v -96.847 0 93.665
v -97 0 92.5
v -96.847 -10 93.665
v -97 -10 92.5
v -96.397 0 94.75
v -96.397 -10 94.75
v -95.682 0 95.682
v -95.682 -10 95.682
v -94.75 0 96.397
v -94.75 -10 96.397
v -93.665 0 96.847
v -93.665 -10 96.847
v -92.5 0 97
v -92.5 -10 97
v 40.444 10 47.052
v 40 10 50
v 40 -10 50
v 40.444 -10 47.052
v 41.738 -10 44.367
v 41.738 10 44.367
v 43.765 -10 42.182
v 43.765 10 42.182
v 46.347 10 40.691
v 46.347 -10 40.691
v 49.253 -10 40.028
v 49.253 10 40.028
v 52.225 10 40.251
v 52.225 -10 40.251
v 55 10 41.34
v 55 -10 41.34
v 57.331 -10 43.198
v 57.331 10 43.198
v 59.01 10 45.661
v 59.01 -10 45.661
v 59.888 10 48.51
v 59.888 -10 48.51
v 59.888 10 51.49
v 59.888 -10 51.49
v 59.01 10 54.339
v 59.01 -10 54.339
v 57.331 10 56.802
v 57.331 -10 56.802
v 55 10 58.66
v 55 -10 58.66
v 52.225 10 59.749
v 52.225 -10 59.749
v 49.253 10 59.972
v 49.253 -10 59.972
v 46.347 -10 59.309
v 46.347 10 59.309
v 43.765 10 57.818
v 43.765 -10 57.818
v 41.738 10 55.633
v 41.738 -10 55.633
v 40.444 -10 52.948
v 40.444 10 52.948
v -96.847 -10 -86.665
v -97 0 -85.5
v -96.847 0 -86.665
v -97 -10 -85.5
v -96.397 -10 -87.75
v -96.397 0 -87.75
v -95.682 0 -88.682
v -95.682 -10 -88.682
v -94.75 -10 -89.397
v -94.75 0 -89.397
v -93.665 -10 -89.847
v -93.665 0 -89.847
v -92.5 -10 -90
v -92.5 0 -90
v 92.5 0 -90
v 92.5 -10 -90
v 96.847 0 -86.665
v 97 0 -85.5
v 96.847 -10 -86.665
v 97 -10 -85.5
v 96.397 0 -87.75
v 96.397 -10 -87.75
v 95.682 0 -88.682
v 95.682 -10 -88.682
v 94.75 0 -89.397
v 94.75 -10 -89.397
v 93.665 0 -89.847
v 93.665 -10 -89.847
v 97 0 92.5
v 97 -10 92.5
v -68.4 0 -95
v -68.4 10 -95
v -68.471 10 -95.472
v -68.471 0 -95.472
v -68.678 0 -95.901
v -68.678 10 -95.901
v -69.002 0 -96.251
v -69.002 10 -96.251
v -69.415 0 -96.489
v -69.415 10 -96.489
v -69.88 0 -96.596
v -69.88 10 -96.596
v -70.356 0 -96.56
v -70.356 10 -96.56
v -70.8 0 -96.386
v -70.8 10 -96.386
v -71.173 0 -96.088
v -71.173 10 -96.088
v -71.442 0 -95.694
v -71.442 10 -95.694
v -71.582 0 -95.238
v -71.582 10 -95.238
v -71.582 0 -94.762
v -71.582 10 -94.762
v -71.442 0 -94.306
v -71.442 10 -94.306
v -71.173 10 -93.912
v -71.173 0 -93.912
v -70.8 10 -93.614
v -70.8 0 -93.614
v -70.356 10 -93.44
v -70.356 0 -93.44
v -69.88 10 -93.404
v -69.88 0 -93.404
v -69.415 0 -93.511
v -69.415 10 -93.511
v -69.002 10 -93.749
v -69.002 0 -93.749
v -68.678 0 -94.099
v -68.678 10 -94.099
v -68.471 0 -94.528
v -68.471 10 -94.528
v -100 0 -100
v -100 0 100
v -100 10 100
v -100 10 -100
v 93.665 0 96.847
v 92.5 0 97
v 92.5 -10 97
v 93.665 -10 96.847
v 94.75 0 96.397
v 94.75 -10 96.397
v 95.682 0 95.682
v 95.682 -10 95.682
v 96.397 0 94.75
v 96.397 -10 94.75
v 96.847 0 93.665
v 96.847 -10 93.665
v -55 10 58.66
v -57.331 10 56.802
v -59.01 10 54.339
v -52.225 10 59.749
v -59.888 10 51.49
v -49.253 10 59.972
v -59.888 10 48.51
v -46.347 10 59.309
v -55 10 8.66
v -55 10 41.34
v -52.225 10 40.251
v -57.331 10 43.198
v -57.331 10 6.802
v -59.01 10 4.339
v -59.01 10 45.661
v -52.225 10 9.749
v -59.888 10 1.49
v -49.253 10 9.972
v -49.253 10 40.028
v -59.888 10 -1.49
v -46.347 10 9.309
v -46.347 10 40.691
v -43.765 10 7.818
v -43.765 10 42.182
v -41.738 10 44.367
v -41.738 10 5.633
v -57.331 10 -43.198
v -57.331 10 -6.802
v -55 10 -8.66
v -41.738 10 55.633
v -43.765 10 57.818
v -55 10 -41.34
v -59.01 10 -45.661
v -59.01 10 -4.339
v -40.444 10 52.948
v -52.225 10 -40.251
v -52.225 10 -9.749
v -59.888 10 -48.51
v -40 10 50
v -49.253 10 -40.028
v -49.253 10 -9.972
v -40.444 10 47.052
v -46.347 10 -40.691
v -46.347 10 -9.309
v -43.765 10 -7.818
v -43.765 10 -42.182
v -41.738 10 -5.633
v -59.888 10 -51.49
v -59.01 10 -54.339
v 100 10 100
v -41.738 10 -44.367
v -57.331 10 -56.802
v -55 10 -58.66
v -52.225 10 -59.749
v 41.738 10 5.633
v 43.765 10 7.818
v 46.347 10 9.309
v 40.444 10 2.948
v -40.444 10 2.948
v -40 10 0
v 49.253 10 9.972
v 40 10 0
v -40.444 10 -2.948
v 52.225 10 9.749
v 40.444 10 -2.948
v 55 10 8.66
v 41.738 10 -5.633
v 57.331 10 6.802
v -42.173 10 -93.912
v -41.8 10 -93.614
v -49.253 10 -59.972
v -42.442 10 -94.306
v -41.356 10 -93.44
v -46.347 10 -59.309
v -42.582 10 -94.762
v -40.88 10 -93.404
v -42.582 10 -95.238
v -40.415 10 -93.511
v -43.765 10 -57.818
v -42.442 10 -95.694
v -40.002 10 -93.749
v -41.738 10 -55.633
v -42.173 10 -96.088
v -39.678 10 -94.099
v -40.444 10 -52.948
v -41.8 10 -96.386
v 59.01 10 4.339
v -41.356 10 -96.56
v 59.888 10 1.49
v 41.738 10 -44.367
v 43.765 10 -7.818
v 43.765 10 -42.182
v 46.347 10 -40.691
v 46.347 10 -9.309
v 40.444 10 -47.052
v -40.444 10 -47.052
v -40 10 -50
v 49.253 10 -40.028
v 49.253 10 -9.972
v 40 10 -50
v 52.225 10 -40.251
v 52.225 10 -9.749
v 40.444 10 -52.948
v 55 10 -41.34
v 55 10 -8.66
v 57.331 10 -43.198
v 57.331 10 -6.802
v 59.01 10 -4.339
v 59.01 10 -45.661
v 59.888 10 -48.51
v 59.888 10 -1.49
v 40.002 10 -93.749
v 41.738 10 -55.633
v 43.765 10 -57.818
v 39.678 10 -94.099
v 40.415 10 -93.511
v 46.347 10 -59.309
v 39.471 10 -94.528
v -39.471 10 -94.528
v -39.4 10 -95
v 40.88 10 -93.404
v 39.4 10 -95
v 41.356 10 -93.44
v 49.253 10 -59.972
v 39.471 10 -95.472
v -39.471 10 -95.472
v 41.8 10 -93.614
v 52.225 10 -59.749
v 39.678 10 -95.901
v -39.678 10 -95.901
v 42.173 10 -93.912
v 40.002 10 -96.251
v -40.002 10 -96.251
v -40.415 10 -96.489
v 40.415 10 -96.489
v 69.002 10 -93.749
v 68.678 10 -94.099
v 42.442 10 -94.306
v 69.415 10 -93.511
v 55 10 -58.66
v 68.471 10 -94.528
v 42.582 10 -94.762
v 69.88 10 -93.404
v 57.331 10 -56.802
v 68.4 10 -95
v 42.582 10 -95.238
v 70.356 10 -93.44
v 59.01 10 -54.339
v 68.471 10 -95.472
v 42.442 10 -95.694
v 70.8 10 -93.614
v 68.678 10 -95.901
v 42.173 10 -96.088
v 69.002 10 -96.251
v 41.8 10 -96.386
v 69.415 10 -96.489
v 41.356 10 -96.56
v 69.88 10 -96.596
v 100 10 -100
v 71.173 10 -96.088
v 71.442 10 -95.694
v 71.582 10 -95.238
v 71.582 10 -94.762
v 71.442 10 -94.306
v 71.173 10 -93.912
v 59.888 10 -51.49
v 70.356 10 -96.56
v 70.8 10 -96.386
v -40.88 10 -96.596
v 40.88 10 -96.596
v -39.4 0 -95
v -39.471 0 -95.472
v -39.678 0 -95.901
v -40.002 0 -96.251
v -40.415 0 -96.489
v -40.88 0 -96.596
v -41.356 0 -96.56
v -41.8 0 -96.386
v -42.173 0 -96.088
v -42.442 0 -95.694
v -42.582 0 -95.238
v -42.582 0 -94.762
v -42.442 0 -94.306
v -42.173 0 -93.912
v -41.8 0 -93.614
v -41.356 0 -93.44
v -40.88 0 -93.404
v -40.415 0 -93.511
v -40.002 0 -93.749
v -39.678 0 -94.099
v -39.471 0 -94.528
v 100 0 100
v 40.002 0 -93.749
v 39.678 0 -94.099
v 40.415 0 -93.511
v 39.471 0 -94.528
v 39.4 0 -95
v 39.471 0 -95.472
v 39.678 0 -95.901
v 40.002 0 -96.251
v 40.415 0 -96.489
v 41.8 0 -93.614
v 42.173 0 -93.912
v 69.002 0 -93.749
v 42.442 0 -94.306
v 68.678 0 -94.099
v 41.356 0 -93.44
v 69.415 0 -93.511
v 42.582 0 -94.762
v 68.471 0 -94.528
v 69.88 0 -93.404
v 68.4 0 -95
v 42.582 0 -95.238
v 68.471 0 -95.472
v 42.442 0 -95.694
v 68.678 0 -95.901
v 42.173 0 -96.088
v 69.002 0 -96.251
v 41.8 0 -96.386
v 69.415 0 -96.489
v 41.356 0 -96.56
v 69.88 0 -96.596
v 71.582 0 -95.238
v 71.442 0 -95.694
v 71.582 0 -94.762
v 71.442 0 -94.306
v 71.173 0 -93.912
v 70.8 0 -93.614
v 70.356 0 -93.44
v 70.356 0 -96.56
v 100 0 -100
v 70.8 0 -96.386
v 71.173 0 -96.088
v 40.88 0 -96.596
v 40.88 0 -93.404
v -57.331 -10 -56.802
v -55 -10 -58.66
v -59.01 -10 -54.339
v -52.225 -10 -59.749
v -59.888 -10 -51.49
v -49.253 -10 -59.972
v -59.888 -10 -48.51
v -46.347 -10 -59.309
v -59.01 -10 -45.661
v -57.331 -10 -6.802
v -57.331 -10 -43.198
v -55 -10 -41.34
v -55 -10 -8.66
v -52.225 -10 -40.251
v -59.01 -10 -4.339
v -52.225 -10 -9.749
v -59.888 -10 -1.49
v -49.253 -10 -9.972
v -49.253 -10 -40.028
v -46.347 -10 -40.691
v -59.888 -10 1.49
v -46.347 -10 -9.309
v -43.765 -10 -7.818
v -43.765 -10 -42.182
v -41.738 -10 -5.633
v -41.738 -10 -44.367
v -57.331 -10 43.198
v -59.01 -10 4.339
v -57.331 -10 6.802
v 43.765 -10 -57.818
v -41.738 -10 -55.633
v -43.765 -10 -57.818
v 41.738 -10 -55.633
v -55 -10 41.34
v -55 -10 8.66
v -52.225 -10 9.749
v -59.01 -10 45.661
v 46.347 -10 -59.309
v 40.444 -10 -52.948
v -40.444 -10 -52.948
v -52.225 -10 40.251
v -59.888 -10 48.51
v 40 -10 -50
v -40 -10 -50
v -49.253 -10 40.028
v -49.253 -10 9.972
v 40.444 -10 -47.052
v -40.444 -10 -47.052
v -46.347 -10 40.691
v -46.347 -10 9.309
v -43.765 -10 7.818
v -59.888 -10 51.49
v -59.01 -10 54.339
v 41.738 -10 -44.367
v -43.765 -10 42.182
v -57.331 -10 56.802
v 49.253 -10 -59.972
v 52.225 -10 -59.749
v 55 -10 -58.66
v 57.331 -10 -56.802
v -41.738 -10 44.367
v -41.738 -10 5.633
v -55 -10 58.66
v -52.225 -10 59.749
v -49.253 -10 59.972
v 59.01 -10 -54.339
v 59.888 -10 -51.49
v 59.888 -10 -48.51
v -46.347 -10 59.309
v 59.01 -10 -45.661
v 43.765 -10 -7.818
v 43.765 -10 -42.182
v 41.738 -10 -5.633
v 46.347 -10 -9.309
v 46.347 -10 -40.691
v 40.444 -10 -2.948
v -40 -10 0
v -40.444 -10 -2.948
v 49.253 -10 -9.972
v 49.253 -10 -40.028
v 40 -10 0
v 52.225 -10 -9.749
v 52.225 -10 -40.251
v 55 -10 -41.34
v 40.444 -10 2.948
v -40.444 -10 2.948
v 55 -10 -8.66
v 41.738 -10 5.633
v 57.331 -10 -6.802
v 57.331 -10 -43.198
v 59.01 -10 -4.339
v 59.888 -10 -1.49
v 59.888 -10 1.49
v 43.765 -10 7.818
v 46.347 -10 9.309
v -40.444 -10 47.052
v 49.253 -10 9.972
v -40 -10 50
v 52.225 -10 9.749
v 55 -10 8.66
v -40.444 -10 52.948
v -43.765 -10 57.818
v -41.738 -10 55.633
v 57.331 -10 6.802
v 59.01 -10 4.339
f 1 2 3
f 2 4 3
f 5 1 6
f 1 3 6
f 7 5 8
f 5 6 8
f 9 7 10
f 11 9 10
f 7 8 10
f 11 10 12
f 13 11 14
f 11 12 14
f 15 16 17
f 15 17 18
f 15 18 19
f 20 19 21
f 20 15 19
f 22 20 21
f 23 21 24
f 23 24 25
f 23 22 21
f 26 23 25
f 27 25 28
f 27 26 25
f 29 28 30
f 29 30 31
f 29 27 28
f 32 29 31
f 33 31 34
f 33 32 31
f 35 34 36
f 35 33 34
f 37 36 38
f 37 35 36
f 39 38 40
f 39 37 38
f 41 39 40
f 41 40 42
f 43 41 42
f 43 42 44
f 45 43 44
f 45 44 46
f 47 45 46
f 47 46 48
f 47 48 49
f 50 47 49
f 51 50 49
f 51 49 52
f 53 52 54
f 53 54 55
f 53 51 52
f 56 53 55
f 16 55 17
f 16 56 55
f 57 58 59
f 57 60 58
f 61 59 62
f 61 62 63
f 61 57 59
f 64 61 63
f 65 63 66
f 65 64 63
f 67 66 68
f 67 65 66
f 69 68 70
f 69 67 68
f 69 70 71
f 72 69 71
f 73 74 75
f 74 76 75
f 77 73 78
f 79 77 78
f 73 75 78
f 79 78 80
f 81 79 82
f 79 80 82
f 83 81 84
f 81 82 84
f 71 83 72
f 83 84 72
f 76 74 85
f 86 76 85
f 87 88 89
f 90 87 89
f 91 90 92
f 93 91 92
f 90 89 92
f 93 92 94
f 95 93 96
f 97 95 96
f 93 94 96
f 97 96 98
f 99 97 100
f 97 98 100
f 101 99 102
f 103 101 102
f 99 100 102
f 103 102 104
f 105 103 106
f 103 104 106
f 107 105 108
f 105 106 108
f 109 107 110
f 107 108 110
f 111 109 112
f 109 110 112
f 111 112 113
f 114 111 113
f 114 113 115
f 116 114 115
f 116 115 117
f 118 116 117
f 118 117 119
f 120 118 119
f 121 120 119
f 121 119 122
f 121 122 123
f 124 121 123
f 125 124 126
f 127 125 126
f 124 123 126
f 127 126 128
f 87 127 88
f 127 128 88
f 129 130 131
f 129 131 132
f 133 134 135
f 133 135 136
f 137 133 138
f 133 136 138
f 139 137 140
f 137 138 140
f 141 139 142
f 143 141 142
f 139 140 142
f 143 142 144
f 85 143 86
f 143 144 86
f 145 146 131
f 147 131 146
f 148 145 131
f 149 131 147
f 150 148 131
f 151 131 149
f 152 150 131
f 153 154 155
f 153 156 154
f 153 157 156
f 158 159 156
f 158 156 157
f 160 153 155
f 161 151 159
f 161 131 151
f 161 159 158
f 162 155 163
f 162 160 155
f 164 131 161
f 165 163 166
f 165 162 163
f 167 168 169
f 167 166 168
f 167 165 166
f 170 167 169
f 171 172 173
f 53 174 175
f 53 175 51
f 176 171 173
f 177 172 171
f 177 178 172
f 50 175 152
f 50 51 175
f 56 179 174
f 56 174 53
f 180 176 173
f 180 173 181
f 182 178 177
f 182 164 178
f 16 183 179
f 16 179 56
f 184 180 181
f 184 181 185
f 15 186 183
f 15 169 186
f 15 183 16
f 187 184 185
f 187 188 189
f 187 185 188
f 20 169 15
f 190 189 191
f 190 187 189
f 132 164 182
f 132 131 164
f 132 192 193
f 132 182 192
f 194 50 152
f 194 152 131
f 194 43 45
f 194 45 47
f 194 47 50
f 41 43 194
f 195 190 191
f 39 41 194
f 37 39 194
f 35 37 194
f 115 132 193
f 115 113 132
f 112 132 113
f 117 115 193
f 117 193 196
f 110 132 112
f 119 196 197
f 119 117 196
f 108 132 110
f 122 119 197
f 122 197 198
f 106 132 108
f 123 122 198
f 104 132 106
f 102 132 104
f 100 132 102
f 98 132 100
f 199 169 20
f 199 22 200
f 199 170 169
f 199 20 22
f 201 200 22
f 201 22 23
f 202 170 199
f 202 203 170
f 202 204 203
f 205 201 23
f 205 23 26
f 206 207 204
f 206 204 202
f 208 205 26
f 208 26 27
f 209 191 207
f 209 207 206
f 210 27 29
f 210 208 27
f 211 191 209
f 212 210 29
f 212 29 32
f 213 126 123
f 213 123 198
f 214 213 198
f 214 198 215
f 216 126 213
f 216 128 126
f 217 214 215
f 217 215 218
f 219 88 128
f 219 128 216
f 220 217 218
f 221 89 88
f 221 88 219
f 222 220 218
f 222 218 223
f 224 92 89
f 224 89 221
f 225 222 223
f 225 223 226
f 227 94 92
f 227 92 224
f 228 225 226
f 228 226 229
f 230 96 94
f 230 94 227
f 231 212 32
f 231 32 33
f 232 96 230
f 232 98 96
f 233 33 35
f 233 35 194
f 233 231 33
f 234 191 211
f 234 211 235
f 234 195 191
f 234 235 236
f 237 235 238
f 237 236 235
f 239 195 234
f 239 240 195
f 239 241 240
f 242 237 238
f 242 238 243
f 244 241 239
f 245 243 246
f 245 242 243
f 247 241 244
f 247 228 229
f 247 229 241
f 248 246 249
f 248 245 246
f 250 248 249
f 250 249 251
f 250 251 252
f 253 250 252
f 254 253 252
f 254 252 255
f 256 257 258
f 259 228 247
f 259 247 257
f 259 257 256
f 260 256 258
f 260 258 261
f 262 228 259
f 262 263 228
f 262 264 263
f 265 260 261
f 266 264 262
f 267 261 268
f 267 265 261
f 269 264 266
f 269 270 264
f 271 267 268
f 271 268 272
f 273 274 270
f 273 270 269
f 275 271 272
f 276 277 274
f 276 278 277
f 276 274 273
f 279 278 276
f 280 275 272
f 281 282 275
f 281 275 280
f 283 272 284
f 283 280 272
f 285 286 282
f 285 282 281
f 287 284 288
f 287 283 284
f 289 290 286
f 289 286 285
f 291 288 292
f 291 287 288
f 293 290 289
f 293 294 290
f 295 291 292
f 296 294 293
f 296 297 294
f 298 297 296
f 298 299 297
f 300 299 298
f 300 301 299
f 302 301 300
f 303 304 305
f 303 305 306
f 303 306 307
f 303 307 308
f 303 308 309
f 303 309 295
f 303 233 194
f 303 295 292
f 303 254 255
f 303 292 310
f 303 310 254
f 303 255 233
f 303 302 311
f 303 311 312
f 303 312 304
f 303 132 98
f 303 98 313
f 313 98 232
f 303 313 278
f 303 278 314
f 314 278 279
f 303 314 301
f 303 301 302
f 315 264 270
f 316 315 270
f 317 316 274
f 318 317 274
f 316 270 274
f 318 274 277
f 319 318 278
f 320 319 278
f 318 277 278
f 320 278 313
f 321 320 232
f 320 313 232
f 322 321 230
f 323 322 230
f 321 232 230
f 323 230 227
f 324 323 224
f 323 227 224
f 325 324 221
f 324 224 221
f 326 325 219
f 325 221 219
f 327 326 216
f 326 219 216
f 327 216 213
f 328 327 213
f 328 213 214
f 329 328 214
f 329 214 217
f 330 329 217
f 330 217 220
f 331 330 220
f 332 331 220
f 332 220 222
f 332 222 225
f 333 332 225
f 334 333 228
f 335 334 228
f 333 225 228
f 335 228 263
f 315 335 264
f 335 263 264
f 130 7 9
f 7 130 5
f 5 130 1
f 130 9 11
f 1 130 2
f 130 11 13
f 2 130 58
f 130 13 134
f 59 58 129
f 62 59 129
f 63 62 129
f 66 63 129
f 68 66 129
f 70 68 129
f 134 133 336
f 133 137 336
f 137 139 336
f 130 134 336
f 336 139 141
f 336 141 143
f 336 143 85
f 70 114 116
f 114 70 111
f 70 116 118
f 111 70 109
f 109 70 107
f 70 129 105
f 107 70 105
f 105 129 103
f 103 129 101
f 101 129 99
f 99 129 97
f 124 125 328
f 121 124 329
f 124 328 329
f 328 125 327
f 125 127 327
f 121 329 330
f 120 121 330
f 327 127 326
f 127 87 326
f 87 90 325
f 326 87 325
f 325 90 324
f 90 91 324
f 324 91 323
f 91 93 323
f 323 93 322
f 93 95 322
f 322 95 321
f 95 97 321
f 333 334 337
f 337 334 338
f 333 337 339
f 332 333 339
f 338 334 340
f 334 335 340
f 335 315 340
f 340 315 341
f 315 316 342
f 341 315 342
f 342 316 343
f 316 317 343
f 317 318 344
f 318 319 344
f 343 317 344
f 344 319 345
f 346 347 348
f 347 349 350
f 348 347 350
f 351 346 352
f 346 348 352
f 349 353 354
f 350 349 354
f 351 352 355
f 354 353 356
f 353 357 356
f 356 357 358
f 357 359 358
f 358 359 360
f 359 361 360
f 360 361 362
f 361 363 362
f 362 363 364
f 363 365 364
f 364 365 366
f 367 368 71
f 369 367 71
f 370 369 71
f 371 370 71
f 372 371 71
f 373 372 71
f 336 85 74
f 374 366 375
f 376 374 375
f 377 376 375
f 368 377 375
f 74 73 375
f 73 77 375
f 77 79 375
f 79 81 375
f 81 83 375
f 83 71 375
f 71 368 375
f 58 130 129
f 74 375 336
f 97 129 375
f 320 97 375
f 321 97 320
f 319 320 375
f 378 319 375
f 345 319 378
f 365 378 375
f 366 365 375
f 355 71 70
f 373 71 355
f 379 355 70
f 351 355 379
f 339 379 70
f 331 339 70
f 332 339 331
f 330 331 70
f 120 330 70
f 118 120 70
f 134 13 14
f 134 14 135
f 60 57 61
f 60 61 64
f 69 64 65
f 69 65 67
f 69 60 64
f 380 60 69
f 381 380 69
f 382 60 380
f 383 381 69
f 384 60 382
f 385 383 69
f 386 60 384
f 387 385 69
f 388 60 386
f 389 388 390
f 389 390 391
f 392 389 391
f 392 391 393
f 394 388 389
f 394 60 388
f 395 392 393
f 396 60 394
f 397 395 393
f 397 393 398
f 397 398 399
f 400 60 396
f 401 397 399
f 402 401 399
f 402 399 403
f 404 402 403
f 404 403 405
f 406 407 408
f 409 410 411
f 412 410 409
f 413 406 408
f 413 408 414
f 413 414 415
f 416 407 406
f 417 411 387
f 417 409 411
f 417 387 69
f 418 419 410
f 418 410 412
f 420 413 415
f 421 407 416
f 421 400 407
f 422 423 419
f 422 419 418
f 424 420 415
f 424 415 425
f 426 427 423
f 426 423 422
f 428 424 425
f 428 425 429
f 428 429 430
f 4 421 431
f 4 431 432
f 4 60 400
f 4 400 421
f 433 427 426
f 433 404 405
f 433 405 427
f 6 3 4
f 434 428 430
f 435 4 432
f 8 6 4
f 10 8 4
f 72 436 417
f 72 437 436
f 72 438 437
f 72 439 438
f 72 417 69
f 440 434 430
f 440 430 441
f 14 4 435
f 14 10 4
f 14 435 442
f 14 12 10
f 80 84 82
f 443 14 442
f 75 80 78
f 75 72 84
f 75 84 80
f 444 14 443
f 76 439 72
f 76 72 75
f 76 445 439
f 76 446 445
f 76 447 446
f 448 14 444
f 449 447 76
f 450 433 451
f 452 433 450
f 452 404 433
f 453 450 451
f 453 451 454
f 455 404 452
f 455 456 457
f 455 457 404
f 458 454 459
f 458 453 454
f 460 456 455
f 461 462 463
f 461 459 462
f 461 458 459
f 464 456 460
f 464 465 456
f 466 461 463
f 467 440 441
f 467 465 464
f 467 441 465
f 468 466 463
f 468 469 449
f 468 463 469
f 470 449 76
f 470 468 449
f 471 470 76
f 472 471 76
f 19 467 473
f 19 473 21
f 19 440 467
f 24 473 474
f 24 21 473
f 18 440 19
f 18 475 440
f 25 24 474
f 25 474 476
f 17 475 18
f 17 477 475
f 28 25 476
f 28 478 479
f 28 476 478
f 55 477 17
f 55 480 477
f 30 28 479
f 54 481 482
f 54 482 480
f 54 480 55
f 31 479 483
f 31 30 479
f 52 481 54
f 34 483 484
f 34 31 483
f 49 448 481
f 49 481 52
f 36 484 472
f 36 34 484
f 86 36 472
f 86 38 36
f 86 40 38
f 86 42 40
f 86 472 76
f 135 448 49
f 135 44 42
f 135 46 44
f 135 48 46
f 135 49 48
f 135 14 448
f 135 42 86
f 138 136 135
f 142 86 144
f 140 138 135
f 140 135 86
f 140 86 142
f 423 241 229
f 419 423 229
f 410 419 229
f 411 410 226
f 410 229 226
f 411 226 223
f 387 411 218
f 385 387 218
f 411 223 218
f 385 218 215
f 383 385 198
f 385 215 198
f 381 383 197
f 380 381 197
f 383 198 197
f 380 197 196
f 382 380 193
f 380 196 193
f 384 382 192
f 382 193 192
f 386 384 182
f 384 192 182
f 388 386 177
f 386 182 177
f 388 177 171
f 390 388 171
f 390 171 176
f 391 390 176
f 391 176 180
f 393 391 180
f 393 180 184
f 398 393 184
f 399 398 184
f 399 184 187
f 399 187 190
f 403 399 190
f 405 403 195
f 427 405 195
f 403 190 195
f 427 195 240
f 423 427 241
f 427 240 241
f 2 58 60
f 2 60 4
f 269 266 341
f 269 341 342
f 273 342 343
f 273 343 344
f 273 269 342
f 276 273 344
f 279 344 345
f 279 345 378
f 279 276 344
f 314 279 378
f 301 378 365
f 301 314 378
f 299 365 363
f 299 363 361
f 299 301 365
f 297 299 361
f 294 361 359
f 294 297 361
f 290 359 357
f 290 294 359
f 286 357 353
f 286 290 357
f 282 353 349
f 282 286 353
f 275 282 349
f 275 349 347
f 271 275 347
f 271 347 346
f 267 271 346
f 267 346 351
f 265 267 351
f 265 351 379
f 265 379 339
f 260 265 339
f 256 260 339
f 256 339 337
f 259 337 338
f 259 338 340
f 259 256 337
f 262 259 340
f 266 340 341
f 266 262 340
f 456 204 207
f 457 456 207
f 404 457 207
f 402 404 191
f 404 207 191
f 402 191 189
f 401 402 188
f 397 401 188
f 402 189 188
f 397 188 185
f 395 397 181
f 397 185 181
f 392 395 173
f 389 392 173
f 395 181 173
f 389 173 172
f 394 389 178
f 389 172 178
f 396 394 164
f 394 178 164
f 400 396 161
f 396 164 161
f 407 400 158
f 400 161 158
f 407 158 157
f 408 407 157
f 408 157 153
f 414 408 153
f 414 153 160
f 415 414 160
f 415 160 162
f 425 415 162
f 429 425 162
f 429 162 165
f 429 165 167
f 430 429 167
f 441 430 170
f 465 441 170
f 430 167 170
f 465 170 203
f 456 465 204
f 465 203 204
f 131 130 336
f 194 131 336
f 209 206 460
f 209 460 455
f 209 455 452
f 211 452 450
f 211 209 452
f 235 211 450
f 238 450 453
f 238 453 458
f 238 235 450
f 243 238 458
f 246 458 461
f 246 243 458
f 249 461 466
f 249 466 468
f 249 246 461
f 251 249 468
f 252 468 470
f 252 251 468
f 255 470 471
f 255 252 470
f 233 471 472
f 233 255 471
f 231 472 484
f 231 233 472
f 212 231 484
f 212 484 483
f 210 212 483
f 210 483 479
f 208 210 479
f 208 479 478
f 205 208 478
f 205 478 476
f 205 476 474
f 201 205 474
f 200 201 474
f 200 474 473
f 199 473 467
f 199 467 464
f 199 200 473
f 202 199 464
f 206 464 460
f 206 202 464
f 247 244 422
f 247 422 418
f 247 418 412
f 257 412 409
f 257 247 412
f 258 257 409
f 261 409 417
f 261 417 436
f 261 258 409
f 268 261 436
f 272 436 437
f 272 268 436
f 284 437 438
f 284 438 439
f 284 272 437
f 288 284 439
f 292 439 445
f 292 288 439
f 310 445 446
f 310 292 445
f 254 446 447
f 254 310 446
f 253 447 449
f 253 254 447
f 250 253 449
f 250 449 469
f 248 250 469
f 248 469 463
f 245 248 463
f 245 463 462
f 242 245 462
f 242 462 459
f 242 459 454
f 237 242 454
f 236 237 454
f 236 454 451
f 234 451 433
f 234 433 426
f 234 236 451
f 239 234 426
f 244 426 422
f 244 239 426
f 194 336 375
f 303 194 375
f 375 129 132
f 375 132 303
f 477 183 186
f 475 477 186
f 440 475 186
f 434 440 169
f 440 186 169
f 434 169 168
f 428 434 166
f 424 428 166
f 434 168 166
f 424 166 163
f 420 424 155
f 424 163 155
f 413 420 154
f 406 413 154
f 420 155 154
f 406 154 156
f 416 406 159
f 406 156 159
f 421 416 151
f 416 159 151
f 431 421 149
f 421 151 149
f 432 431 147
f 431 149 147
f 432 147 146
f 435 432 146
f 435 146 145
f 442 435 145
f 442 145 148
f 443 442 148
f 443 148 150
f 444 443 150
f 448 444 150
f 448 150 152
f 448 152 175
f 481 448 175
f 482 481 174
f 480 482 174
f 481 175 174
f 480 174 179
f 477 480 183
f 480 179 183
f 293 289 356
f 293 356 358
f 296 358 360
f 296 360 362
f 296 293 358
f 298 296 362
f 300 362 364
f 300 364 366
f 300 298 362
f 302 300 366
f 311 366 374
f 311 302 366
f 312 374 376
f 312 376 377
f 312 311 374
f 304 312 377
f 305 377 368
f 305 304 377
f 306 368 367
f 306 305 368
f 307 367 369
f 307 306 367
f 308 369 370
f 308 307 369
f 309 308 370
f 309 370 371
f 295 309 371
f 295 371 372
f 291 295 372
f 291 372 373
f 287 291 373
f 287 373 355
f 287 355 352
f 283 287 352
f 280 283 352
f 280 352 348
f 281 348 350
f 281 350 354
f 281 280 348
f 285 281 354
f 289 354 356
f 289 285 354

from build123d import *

# Parameters (mm, degrees)
CROQUIS1_W              = 200
CROQUIS1_H              = 200
SALIENTE_EXTRUIR1_DEPTH = 10
CROQUIS2_W              = 194
CROQUIS2_H              = 187
SALIENTE_EXTRUIR2_DEPTH = 10
REDONDEO2_R             = 4.5
CROQUIS3_R              = 10
CORTAR_EXTRUIR1_DEPTH   = 20
CROQUIS4_R              = 1.6
CORTAR_EXTRUIR2_DEPTH   = 10


with BuildPart() as part:
    # Croquis1 → Saliente-Extruir1 (new body)
    with BuildSketch(Plane(origin=(0, 0, 0), x_dir=(1, 0, 0), z_dir=(0, 1, 0))):
        Rectangle(CROQUIS1_W, CROQUIS1_H)
    extrude(amount=SALIENTE_EXTRUIR1_DEPTH)

    # Croquis2 → Saliente-Extruir2 (add)
    with BuildSketch(Plane.XZ):
        with Locations((0, 3.5)):
            Rectangle(CROQUIS2_W, CROQUIS2_H)
    extrude(amount=SALIENTE_EXTRUIR2_DEPTH)

    # Redondeo2
    redondeo2_edges = [part.edges().sort_by_distance(p)[0] for p in [
        (-97, -5, 97),
        (-97, -5, -90),
        (97, -5, -90),
        (97, -5, 97),
    ]]
    fillet(redondeo2_edges, radius=REDONDEO2_R)

    # Croquis3 → Cortar-Extruir1 (cut)
    with BuildSketch(Plane(origin=(0, 10, 0), x_dir=(1, 0, 0), z_dir=(0, 1, 0))):
        with Locations((-50, 50)):
            Circle(CROQUIS3_R)
        with Locations((-50, 0)):
            Circle(CROQUIS3_R)
        with Locations((-50, -50)):
            Circle(CROQUIS3_R)
    cortar_extruir1 = extrude(amount=-CORTAR_EXTRUIR1_DEPTH, mode=Mode.SUBTRACT)

    # Simetría1: Cortar-Extruir1 across plane
    add(cortar_extruir1.mirror(Plane(origin=(0, 0, 0), x_dir=(0, 0, 1), z_dir=(1, 0, 0))), mode=Mode.SUBTRACT)

    # Croquis4 → Cortar-Extruir2 (cut)
    with BuildSketch(Plane(origin=(0, 10, 0), x_dir=(1, 0, 0), z_dir=(0, 1, 0))):
        with Locations((-70, 95)):
            Circle(CROQUIS4_R)
        with Locations((-41, 95)):
            Circle(CROQUIS4_R)
    cortar_extruir2 = extrude(amount=-CORTAR_EXTRUIR2_DEPTH, mode=Mode.SUBTRACT)

    # Simetría2: Cortar-Extruir2 across plane
    add(cortar_extruir2.mirror(Plane(origin=(0, 0, 0), x_dir=(0, 0, 1), z_dir=(1, 0, 0))), mode=Mode.SUBTRACT)


solid = part.part
